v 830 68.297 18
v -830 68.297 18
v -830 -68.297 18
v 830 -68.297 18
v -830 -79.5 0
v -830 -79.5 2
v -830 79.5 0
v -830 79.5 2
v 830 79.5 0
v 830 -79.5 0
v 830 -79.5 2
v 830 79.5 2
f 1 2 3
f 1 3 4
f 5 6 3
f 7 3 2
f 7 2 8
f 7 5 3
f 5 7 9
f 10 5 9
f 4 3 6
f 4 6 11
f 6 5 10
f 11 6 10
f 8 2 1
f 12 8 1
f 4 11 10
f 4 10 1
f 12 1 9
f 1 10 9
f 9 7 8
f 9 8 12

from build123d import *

# Parameters (mm, degrees)
SKETCH_1_W      = 1660
SKETCH_1_H      = 159
EXTRUDE_1_DEPTH = 18
CHAMFER_1_SIZE  = 16
CHAMFER_1_SIZE2 = 11.203320611
CHAMFER_2_SIZE  = 16
CHAMFER_2_SIZE2 = 11.203320611


with BuildPart() as part:
    # 草图1 → 凸台-拉伸1 (new body)
    with BuildSketch(Plane.XY):
        Rectangle(SKETCH_1_W, SKETCH_1_H)
    extrude(amount=EXTRUDE_1_DEPTH)

    # 倒角1
    chamfer_1_edges = [part.edges().sort_by_distance(p)[0] for p in [
        (0, 79.5, 18),
    ]]
    chamfer_1_side = [part.faces().sort_by_distance(p)[0] for p in [
        (0, 79.5, 9),
    ]]
    chamfer(chamfer_1_edges, length=CHAMFER_1_SIZE, length2=CHAMFER_1_SIZE2, reference=chamfer_1_side[0])

    # 倒角2
    chamfer_2_edges = [part.edges().sort_by_distance(p)[0] for p in [
        (0, -79.5, 18),
    ]]
    chamfer_2_side = [part.faces().sort_by_distance(p)[0] for p in [
        (0, -79.5, 9),
    ]]
    chamfer(chamfer_2_edges, length=CHAMFER_2_SIZE, length2=CHAMFER_2_SIZE2, reference=chamfer_2_side[0])


solid = part.part
